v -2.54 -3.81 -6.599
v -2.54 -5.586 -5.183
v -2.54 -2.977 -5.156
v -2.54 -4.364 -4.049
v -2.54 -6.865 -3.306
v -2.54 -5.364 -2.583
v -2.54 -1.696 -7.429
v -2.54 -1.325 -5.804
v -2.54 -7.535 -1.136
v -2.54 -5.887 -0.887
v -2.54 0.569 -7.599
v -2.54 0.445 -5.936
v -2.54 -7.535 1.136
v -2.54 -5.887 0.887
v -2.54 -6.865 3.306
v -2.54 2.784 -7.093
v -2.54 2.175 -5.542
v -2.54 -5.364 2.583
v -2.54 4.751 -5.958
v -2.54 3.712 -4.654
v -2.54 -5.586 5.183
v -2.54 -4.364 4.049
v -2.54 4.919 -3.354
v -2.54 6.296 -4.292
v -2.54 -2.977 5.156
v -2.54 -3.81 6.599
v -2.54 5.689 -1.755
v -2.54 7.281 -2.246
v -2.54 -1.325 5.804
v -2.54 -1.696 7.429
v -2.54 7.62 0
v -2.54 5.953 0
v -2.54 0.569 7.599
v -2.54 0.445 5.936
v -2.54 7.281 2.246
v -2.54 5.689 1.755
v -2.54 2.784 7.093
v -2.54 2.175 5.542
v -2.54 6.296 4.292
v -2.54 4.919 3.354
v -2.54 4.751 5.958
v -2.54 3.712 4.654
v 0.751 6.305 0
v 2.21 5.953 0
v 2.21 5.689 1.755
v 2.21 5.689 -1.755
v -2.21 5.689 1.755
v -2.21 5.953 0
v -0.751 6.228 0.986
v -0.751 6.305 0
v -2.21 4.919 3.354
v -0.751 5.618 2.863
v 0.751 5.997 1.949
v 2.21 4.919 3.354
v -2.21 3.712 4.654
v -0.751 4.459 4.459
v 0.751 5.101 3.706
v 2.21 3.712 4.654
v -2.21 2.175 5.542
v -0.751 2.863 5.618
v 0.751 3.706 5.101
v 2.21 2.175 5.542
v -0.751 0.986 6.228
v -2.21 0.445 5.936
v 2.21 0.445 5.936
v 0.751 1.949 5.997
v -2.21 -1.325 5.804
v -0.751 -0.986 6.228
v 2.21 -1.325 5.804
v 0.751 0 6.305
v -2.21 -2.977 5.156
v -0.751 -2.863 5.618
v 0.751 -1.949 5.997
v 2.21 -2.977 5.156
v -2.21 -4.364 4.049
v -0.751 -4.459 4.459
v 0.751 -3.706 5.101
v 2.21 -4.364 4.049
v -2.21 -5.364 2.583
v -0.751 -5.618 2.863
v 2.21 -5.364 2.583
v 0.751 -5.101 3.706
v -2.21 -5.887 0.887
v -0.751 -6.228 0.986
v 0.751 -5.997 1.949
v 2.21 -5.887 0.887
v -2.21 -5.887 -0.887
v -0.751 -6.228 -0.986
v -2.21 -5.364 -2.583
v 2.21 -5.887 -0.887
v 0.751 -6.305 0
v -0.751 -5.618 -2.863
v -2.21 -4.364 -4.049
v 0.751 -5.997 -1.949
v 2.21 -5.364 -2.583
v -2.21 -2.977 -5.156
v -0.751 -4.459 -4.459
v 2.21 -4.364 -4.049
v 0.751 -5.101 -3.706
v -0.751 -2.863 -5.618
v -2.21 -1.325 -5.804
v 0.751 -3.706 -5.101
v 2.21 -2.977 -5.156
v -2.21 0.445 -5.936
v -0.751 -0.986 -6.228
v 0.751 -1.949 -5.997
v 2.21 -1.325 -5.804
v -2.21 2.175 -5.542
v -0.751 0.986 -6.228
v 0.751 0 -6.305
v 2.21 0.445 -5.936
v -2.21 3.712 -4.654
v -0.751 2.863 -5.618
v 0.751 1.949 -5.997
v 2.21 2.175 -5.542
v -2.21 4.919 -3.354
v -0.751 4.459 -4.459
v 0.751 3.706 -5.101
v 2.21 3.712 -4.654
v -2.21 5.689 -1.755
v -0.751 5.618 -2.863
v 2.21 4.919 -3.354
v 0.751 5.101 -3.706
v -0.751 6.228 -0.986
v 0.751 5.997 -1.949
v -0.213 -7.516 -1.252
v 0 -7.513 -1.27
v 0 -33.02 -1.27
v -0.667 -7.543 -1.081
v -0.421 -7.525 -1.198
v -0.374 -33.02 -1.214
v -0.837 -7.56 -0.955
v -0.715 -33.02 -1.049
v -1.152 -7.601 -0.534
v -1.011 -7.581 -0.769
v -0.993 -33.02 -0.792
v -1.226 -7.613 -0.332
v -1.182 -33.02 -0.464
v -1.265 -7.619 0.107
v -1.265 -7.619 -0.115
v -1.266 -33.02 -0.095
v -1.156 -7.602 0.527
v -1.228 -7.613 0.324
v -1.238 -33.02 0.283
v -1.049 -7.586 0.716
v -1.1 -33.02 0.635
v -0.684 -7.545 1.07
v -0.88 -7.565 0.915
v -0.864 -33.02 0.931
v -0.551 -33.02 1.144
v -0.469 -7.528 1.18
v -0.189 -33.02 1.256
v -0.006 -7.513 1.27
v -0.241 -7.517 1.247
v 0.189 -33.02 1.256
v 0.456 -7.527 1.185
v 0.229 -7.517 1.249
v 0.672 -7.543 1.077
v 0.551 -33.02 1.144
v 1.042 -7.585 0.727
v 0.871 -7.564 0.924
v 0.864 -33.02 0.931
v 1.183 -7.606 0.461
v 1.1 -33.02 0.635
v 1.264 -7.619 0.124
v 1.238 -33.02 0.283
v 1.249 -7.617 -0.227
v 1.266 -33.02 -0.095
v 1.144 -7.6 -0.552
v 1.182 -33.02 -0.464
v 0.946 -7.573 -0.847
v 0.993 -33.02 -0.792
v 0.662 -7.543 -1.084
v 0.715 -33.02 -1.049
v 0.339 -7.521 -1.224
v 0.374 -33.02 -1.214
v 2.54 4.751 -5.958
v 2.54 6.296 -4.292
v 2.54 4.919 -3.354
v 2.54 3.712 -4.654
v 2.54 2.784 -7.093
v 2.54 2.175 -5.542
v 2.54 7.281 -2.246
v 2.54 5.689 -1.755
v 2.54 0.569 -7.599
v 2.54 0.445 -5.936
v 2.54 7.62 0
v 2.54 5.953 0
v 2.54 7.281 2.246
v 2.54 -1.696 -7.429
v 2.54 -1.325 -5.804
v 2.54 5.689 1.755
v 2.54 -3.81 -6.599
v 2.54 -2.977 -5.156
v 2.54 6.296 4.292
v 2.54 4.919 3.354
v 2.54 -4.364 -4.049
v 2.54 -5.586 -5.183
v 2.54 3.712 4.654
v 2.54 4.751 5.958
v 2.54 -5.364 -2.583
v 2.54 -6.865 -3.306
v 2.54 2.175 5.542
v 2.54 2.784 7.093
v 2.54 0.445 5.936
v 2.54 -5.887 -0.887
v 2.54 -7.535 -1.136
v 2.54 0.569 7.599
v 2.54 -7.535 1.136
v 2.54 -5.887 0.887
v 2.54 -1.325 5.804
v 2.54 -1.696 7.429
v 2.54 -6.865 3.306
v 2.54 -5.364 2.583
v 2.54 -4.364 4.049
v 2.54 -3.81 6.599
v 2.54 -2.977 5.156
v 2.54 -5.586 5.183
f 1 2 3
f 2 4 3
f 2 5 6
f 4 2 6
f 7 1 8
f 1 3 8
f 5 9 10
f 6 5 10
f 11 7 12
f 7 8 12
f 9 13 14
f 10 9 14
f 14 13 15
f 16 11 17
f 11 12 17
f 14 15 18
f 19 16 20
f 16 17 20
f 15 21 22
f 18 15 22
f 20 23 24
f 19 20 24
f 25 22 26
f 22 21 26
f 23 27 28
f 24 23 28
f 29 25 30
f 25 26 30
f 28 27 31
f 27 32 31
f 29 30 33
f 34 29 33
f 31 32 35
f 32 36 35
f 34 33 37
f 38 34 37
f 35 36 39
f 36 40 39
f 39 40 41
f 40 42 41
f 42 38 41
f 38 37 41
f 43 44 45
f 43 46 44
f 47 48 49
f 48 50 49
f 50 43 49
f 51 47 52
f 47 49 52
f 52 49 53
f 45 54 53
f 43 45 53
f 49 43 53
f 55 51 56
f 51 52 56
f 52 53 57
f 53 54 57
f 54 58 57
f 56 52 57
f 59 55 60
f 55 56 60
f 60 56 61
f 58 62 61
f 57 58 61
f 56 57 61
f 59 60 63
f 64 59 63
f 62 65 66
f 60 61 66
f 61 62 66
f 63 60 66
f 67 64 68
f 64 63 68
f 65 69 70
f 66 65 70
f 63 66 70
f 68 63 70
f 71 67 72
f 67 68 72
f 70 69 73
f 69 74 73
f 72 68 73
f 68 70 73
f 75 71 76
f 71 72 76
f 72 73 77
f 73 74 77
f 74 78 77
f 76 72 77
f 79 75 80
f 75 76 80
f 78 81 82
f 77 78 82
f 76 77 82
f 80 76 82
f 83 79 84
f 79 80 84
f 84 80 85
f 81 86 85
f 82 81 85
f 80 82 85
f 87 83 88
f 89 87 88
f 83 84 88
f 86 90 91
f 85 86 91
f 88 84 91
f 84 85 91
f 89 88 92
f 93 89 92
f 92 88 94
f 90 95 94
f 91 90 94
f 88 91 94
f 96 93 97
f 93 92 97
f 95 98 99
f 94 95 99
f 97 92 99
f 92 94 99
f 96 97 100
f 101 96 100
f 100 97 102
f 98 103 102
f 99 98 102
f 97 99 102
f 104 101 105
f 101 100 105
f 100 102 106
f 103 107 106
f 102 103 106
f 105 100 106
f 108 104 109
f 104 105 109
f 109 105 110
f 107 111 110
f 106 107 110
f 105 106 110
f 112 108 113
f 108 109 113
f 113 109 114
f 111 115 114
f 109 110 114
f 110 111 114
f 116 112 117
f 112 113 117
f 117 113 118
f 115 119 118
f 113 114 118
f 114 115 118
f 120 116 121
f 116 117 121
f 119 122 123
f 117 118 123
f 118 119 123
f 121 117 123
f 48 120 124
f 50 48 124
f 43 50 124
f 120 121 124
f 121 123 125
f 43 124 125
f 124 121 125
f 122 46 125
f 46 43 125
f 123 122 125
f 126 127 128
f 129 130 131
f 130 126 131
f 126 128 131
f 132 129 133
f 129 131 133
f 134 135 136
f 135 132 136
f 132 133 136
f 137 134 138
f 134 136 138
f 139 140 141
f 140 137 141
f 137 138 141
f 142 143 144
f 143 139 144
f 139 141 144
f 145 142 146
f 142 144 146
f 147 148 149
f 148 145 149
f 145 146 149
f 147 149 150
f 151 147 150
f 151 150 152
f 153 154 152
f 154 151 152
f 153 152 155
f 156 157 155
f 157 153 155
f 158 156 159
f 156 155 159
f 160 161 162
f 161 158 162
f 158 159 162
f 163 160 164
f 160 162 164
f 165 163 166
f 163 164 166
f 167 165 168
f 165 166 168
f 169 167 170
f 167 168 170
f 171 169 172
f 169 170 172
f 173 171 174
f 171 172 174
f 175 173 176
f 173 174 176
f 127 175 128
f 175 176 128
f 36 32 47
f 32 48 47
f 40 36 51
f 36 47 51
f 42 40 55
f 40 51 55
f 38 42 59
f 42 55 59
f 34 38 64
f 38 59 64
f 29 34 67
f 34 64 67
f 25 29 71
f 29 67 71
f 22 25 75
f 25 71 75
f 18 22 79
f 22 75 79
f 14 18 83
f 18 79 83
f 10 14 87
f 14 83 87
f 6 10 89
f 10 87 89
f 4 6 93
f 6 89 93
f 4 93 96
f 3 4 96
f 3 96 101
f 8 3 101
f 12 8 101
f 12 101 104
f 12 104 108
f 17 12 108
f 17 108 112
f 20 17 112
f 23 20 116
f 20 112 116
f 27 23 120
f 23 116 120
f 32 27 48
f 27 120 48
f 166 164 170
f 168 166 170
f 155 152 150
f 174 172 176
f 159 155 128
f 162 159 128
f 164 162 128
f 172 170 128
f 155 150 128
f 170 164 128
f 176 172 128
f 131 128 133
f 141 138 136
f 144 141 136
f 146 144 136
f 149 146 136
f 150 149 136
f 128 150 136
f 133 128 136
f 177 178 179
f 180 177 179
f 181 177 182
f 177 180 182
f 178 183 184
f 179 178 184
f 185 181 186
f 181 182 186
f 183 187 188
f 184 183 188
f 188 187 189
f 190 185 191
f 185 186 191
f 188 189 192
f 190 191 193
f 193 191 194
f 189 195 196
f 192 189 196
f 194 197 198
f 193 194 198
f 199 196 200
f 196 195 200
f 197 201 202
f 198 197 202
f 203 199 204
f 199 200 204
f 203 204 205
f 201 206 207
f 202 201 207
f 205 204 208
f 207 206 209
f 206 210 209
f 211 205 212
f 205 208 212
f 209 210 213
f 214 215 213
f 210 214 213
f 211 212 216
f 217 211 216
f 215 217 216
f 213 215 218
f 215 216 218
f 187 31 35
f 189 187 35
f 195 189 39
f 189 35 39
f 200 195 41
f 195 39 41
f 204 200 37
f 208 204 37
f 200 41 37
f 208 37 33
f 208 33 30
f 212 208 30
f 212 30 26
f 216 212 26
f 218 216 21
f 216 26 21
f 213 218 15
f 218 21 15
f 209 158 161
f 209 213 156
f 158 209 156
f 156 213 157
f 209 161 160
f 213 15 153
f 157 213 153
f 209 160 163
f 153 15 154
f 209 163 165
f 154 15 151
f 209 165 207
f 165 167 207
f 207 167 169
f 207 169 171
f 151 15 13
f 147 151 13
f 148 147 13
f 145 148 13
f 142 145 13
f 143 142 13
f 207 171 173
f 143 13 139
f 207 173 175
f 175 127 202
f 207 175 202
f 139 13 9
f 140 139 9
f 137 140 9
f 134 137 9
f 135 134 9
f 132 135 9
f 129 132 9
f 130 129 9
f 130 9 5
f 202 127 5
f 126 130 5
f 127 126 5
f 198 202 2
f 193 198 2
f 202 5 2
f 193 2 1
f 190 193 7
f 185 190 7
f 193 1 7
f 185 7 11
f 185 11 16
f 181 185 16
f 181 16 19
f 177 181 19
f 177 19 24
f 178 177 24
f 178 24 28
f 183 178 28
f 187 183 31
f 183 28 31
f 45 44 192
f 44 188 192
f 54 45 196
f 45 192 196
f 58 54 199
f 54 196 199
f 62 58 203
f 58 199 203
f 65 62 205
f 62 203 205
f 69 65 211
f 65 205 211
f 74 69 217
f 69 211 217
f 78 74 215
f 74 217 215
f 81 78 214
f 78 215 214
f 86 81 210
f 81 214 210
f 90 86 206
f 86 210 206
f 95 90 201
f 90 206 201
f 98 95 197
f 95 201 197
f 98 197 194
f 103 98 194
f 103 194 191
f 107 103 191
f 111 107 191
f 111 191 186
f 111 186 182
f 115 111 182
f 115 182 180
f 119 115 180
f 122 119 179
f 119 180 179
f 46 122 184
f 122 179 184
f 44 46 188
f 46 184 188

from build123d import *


with BuildPart() as part:
    # Sketch1 → Revolve1 (revolve)
    with BuildSketch(Plane.XY):
        with BuildLine():
            Line((2.54, 7.62), (-2.54, 7.62))
            Line((-2.54, 7.62), (-2.54, 5.953125))
            Line((-2.54, 5.953125), (-2.209706481, 5.953125))
            ThreePointArc((-2.209706481, 5.953125), (0, 6.35), (2.209706481, 5.953125))
            Line((2.209706481, 5.953125), (2.54, 5.953125))
            Line((2.54, 5.953125), (2.54, 7.62))
        make_face()
    revolve(axis=Axis((-10.16, 0, 0), (1, 0, 0)))

    # Sketch2 → Revolve2 (revolve)
    with BuildSketch(Plane(origin=(0, 0, 0), x_dir=(0, 0, -1), z_dir=(1, 0, 0))):
        with BuildLine():
            Line((1.27, -7.513421325), (1.27, -33.02))
            Line((1.27, -33.02), (0, -33.02))
            Line((0, -33.02), (0, -7.62))
            ThreePointArc((0, -7.62), (0.637232103, -7.593308584), (1.27, -7.513421325))
        make_face()
    revolve(axis=Axis((0, -33.02, 0), (0, 1, 0)))


solid = part.part
